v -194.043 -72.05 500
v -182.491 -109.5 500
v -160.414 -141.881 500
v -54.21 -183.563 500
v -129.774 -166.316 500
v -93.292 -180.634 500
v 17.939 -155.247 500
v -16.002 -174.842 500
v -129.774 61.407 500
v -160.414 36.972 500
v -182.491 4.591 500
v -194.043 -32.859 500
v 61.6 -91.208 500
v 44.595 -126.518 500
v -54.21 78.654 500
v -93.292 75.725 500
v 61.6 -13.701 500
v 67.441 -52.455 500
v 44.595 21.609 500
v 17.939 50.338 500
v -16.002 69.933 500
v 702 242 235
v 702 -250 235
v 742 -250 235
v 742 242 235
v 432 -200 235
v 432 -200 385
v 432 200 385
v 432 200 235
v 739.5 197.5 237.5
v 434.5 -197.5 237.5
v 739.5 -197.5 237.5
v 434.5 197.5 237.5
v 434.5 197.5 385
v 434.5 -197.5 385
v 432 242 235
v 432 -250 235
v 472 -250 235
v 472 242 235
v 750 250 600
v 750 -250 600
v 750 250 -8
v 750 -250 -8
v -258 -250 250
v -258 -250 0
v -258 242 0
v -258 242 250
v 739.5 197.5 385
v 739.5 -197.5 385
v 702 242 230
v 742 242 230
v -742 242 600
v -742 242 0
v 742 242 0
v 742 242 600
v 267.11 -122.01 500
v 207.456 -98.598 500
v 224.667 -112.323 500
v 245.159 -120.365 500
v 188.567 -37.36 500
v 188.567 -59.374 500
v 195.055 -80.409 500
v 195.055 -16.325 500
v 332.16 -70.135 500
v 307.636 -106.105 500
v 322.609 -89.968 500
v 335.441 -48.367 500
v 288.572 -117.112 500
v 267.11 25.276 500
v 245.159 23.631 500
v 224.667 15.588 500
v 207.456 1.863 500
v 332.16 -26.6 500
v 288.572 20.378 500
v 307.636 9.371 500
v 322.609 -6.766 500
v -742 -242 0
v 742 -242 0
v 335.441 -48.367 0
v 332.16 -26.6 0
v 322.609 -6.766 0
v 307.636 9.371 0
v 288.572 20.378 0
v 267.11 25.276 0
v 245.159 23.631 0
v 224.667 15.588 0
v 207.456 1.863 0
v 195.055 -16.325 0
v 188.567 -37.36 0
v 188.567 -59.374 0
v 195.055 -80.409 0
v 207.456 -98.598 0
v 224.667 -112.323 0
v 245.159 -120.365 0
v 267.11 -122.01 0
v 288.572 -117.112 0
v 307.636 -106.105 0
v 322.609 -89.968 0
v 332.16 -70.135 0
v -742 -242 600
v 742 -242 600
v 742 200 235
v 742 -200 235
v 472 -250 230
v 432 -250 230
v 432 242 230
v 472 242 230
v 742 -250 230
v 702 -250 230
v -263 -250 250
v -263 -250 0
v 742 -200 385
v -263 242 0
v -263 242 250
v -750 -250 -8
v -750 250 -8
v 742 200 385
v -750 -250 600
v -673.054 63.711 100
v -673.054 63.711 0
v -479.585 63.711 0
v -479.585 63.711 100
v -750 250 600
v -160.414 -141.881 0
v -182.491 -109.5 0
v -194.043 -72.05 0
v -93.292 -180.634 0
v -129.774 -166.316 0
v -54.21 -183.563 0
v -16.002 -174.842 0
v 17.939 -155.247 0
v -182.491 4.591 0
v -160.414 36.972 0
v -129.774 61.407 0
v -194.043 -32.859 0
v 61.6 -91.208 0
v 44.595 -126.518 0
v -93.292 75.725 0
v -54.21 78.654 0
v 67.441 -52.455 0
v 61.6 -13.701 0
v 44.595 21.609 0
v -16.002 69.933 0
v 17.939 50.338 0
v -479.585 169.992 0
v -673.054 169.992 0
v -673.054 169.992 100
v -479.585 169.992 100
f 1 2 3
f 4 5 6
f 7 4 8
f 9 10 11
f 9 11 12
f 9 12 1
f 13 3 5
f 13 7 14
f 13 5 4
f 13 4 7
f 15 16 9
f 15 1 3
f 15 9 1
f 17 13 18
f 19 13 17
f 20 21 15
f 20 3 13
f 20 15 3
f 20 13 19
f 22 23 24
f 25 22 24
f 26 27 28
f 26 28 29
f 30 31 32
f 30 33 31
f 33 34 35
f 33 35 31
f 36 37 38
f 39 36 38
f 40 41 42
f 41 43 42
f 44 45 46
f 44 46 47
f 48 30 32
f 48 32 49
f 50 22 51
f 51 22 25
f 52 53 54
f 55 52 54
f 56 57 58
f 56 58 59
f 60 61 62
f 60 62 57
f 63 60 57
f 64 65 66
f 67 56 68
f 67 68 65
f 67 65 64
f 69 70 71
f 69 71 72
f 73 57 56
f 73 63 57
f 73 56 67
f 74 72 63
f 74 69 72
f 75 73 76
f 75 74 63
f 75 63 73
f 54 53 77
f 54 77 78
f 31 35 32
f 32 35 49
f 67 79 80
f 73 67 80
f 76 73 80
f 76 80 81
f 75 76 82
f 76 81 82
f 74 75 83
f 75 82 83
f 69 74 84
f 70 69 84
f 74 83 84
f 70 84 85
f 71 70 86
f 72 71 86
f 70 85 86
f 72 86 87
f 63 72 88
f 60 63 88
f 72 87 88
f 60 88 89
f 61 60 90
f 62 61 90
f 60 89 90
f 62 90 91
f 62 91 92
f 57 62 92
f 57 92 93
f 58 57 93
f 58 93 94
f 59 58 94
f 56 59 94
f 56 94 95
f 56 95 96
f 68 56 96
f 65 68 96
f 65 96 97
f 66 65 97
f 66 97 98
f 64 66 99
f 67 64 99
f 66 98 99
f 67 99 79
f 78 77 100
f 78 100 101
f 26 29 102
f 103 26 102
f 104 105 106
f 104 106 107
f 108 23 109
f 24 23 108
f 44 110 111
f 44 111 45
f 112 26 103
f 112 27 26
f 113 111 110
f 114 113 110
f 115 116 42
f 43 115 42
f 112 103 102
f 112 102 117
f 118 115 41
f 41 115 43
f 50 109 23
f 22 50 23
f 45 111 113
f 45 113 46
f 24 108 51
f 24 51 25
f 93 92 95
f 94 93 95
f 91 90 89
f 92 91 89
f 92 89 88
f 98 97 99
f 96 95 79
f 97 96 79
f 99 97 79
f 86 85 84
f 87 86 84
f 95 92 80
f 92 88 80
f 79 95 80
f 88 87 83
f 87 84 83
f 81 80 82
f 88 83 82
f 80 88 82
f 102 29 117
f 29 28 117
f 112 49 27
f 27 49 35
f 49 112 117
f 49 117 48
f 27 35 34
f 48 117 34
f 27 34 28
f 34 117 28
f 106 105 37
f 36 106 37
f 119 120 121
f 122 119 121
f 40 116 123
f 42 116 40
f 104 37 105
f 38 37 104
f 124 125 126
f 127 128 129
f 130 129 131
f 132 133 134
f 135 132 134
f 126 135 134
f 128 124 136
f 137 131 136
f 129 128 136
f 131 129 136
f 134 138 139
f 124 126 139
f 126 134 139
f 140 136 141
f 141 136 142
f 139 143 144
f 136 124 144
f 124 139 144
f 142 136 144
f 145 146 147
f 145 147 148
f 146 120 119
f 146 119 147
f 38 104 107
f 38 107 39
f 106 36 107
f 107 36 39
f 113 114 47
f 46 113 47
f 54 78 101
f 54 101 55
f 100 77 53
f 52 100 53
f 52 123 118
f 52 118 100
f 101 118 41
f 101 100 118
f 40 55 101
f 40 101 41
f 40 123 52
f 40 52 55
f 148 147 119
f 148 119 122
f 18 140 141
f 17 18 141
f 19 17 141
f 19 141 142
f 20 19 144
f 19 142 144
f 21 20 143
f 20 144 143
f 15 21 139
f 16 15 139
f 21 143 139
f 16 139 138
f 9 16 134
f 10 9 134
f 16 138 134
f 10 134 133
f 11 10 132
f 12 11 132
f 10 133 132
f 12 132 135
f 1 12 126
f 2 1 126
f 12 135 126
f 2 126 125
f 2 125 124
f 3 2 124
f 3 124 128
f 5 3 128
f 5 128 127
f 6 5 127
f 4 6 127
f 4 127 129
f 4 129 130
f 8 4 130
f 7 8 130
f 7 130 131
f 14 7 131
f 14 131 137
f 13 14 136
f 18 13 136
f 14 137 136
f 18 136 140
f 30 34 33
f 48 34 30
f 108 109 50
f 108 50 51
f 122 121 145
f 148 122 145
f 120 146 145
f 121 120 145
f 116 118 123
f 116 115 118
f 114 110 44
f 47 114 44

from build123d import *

# Parameters (mm, degrees)
F0_W          = 1500
F0_H          = 500
F0_W_2        = 1484
F0_H_2        = 484
F1_DEPTH      = 8
F2_DEPTH      = 600
F4_W          = 5
F4_H          = 250
F5_DEPTH      = 492
F4_W_2        = 40
F4_H_2        = 5
F7_DEPTH      = 200
F7_DEPTH_BACK = 200
F8_T          = -2.5
F9_R          = 131.4761602714
F10_DEPTH     = 500
F9_R_2        = 73.8496876532
F11_W         = 193.4688985348
F11_H         = 106.2804311514
F12_DEPTH     = 100


with BuildPart() as f1:
    # F0 (on Top) → F1 (new body)
    with BuildSketch(Plane.XY):
        Rectangle(F0_W, F0_H)
        Rectangle(F0_W_2, F0_H_2, mode=Mode.SUBTRACT)
        Rectangle(F0_W_2, F0_H_2)
    extrude(amount=-F1_DEPTH)


with BuildPart() as f2:
    # F0 (on Top) → F2 (new body)
    with BuildSketch(Plane.XY):
        Rectangle(F0_W, F0_H)
        Rectangle(F0_W_2, F0_H_2, mode=Mode.SUBTRACT)
    extrude(amount=F2_DEPTH)


with BuildPart() as f1_1:
    add(f1.part)

    # F3: union F2
    add(f2.part)


with BuildPart() as f5:
    # F4 (on face) → F5 (new body, through all)
    with BuildSketch(Plane.XZ.offset(250)):
        with Locations((-260.5, 125)):
            Rectangle(F4_W, F4_H)
    extrude(amount=-F5_DEPTH)


with BuildPart() as f5b:
    # F4 (on face) → F5, piece 2 (new body, through all)
    with BuildSketch(Plane.XZ.offset(250)):
        with Locations((722, 232.5)):
            Rectangle(F4_W_2, F4_H_2)
    extrude(amount=-F5_DEPTH)


with BuildPart() as f5c:
    # F4 (on face) → F5, piece 3 (new body, through all)
    with BuildSketch(Plane.XZ.offset(250)):
        with Locations((452, 232.5)):
            Rectangle(F4_W_2, F4_H_2)
    extrude(amount=-F5_DEPTH)


with BuildPart() as f7:
    # F6 (on Front) → F7 (new body, two sides)
    with BuildSketch(Plane.XZ) as f7_sk:
        Polygon((432, 235), (472, 235), (702, 235), (742, 235), (742, 385), (432, 385), align=None)
    extrude(amount=-F7_DEPTH)
    extrude(f7_sk.sketch, amount=F7_DEPTH_BACK)

    # F8
    f8_openings = [f7.faces().sort_by_distance(p)[0] for p in [
        (587, 0, 385),
    ]]
    offset(amount=F8_T, openings=f8_openings)


with BuildPart() as f10:
    # F9 (on face) → F10 (new body)
    with BuildSketch(Plane.XY):
        with Locations((-64.0354678035, -52.4545870721)):
            Circle(F9_R)
    extrude(amount=F10_DEPTH)


with BuildPart() as f10b:
    # F9 (on face) → F10, piece 2 (new body)
    with BuildSketch(Plane.XY):
        with Locations((261.5916728973, -48.3672171831)):
            Circle(F9_R_2)
    extrude(amount=F10_DEPTH)


with BuildPart() as f12:
    # F11 (on face) → F12 (new body)
    with BuildSketch(Plane.XY):
        with Locations((-576.319232583, 116.8514415622)):
            Rectangle(F11_W, F11_H)
    extrude(amount=F12_DEPTH)


solid = Compound([f1_1.part, f5.part, f5b.part, f5c.part, f7.part, f10.part, f10b.part, f12.part])
